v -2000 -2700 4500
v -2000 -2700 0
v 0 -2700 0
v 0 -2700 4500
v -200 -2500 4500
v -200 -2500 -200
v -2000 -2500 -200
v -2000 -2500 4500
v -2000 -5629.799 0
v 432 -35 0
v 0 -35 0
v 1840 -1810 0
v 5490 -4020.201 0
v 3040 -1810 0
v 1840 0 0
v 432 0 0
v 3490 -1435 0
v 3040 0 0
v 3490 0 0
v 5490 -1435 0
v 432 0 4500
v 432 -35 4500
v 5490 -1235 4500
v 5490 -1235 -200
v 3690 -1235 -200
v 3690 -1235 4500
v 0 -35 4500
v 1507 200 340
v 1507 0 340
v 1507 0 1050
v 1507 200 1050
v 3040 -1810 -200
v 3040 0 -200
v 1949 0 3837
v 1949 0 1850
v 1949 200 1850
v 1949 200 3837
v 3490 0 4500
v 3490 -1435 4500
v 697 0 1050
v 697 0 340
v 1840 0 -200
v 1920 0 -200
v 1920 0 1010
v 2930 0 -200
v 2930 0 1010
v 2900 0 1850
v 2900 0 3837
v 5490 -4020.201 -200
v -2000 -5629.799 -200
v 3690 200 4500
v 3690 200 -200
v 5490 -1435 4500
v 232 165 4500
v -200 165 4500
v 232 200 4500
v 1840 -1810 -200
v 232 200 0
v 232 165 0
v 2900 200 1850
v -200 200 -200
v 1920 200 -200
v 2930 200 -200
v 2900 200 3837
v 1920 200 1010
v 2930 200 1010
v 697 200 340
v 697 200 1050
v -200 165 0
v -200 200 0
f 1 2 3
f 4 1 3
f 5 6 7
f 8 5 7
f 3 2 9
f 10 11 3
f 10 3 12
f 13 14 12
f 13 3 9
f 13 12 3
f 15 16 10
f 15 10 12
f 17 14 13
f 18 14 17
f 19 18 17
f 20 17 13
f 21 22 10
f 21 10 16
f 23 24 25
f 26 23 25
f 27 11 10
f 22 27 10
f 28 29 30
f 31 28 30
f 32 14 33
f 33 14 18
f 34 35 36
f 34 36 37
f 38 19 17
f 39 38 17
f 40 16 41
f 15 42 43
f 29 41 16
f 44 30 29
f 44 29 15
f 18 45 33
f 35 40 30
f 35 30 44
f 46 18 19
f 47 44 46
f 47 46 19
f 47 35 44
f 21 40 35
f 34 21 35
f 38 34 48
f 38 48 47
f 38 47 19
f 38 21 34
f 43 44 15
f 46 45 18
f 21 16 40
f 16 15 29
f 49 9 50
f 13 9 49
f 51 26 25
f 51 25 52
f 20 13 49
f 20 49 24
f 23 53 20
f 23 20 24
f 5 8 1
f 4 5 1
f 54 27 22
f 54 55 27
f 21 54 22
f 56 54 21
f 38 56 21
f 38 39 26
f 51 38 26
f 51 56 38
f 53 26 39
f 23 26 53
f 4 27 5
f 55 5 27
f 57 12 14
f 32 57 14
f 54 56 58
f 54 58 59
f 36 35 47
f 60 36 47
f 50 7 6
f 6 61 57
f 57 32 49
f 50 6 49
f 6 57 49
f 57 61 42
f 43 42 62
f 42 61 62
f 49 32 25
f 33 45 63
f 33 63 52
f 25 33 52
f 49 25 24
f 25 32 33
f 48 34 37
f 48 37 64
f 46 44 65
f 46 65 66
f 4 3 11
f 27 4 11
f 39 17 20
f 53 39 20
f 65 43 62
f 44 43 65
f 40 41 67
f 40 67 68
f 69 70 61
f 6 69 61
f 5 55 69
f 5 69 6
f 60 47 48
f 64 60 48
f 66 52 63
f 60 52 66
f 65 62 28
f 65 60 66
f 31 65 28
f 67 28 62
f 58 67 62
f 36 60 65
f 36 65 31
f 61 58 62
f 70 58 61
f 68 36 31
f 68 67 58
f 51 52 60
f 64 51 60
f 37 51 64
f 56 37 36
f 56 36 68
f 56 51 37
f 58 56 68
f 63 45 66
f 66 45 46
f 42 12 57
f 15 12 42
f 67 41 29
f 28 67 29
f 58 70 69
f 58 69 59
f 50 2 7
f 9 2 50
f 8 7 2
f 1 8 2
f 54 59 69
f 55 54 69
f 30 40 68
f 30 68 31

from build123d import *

# Parameters (mm, degrees)
F1_DEPTH = 4500
F3_DEPTH = 200
F4_W     = 951
F4_H     = 1987
F4_W_2   = 1010
F4_H_2   = 1210
F4_W_3   = 810
F4_H_3   = 710
F5_DEPTH = 200
F6_W     = 1200
F6_H     = 1810
F7_DEPTH = 200


with BuildPart() as f1:
    # F0 (on Top) → F1 (new body)
    with BuildSketch(Plane.XY):
        Polygon((-2000, -2500), (-2000, -2700), (0, -2700), (0, -35), (432, -35), (432, 0), (3490, 0), (3490, -1435), (5490, -1435), (5490, -1235), (3690, -1235), (3690, 200), (232, 200), (232, 165), (-200, 165), (-200, -2500), align=None)
    extrude(amount=F1_DEPTH)

    # F2 (on Top) → F3 (join)
    with BuildSketch(Plane.XY):
        Polygon((-2000, -2500), (-2000, -5629.799427), (5490, -4020.200573), (5490, -1235), (3690, -1235), (3690, 200), (-200, 200), (-200, -2500), align=None)
    extrude(amount=-F3_DEPTH)

    # F4 (on face) → F5 (cut, through all)
    with BuildSketch(Plane.XZ):
        with Locations((2424.5, 2843.5)):
            Rectangle(F4_W, F4_H)
        with Locations((2425, 405)):
            Rectangle(F4_W_2, F4_H_2)
        with Locations((1102, 695)):
            Rectangle(F4_W_3, F4_H_3)
    extrude(amount=-F5_DEPTH, mode=Mode.SUBTRACT)

    # F6 (on face) → F7 (cut, through all)
    with BuildSketch(Plane.XY):
        with Locations((2440, -905)):
            Rectangle(F6_W, F6_H)
    extrude(amount=-F7_DEPTH, mode=Mode.SUBTRACT)


solid = f1.part
